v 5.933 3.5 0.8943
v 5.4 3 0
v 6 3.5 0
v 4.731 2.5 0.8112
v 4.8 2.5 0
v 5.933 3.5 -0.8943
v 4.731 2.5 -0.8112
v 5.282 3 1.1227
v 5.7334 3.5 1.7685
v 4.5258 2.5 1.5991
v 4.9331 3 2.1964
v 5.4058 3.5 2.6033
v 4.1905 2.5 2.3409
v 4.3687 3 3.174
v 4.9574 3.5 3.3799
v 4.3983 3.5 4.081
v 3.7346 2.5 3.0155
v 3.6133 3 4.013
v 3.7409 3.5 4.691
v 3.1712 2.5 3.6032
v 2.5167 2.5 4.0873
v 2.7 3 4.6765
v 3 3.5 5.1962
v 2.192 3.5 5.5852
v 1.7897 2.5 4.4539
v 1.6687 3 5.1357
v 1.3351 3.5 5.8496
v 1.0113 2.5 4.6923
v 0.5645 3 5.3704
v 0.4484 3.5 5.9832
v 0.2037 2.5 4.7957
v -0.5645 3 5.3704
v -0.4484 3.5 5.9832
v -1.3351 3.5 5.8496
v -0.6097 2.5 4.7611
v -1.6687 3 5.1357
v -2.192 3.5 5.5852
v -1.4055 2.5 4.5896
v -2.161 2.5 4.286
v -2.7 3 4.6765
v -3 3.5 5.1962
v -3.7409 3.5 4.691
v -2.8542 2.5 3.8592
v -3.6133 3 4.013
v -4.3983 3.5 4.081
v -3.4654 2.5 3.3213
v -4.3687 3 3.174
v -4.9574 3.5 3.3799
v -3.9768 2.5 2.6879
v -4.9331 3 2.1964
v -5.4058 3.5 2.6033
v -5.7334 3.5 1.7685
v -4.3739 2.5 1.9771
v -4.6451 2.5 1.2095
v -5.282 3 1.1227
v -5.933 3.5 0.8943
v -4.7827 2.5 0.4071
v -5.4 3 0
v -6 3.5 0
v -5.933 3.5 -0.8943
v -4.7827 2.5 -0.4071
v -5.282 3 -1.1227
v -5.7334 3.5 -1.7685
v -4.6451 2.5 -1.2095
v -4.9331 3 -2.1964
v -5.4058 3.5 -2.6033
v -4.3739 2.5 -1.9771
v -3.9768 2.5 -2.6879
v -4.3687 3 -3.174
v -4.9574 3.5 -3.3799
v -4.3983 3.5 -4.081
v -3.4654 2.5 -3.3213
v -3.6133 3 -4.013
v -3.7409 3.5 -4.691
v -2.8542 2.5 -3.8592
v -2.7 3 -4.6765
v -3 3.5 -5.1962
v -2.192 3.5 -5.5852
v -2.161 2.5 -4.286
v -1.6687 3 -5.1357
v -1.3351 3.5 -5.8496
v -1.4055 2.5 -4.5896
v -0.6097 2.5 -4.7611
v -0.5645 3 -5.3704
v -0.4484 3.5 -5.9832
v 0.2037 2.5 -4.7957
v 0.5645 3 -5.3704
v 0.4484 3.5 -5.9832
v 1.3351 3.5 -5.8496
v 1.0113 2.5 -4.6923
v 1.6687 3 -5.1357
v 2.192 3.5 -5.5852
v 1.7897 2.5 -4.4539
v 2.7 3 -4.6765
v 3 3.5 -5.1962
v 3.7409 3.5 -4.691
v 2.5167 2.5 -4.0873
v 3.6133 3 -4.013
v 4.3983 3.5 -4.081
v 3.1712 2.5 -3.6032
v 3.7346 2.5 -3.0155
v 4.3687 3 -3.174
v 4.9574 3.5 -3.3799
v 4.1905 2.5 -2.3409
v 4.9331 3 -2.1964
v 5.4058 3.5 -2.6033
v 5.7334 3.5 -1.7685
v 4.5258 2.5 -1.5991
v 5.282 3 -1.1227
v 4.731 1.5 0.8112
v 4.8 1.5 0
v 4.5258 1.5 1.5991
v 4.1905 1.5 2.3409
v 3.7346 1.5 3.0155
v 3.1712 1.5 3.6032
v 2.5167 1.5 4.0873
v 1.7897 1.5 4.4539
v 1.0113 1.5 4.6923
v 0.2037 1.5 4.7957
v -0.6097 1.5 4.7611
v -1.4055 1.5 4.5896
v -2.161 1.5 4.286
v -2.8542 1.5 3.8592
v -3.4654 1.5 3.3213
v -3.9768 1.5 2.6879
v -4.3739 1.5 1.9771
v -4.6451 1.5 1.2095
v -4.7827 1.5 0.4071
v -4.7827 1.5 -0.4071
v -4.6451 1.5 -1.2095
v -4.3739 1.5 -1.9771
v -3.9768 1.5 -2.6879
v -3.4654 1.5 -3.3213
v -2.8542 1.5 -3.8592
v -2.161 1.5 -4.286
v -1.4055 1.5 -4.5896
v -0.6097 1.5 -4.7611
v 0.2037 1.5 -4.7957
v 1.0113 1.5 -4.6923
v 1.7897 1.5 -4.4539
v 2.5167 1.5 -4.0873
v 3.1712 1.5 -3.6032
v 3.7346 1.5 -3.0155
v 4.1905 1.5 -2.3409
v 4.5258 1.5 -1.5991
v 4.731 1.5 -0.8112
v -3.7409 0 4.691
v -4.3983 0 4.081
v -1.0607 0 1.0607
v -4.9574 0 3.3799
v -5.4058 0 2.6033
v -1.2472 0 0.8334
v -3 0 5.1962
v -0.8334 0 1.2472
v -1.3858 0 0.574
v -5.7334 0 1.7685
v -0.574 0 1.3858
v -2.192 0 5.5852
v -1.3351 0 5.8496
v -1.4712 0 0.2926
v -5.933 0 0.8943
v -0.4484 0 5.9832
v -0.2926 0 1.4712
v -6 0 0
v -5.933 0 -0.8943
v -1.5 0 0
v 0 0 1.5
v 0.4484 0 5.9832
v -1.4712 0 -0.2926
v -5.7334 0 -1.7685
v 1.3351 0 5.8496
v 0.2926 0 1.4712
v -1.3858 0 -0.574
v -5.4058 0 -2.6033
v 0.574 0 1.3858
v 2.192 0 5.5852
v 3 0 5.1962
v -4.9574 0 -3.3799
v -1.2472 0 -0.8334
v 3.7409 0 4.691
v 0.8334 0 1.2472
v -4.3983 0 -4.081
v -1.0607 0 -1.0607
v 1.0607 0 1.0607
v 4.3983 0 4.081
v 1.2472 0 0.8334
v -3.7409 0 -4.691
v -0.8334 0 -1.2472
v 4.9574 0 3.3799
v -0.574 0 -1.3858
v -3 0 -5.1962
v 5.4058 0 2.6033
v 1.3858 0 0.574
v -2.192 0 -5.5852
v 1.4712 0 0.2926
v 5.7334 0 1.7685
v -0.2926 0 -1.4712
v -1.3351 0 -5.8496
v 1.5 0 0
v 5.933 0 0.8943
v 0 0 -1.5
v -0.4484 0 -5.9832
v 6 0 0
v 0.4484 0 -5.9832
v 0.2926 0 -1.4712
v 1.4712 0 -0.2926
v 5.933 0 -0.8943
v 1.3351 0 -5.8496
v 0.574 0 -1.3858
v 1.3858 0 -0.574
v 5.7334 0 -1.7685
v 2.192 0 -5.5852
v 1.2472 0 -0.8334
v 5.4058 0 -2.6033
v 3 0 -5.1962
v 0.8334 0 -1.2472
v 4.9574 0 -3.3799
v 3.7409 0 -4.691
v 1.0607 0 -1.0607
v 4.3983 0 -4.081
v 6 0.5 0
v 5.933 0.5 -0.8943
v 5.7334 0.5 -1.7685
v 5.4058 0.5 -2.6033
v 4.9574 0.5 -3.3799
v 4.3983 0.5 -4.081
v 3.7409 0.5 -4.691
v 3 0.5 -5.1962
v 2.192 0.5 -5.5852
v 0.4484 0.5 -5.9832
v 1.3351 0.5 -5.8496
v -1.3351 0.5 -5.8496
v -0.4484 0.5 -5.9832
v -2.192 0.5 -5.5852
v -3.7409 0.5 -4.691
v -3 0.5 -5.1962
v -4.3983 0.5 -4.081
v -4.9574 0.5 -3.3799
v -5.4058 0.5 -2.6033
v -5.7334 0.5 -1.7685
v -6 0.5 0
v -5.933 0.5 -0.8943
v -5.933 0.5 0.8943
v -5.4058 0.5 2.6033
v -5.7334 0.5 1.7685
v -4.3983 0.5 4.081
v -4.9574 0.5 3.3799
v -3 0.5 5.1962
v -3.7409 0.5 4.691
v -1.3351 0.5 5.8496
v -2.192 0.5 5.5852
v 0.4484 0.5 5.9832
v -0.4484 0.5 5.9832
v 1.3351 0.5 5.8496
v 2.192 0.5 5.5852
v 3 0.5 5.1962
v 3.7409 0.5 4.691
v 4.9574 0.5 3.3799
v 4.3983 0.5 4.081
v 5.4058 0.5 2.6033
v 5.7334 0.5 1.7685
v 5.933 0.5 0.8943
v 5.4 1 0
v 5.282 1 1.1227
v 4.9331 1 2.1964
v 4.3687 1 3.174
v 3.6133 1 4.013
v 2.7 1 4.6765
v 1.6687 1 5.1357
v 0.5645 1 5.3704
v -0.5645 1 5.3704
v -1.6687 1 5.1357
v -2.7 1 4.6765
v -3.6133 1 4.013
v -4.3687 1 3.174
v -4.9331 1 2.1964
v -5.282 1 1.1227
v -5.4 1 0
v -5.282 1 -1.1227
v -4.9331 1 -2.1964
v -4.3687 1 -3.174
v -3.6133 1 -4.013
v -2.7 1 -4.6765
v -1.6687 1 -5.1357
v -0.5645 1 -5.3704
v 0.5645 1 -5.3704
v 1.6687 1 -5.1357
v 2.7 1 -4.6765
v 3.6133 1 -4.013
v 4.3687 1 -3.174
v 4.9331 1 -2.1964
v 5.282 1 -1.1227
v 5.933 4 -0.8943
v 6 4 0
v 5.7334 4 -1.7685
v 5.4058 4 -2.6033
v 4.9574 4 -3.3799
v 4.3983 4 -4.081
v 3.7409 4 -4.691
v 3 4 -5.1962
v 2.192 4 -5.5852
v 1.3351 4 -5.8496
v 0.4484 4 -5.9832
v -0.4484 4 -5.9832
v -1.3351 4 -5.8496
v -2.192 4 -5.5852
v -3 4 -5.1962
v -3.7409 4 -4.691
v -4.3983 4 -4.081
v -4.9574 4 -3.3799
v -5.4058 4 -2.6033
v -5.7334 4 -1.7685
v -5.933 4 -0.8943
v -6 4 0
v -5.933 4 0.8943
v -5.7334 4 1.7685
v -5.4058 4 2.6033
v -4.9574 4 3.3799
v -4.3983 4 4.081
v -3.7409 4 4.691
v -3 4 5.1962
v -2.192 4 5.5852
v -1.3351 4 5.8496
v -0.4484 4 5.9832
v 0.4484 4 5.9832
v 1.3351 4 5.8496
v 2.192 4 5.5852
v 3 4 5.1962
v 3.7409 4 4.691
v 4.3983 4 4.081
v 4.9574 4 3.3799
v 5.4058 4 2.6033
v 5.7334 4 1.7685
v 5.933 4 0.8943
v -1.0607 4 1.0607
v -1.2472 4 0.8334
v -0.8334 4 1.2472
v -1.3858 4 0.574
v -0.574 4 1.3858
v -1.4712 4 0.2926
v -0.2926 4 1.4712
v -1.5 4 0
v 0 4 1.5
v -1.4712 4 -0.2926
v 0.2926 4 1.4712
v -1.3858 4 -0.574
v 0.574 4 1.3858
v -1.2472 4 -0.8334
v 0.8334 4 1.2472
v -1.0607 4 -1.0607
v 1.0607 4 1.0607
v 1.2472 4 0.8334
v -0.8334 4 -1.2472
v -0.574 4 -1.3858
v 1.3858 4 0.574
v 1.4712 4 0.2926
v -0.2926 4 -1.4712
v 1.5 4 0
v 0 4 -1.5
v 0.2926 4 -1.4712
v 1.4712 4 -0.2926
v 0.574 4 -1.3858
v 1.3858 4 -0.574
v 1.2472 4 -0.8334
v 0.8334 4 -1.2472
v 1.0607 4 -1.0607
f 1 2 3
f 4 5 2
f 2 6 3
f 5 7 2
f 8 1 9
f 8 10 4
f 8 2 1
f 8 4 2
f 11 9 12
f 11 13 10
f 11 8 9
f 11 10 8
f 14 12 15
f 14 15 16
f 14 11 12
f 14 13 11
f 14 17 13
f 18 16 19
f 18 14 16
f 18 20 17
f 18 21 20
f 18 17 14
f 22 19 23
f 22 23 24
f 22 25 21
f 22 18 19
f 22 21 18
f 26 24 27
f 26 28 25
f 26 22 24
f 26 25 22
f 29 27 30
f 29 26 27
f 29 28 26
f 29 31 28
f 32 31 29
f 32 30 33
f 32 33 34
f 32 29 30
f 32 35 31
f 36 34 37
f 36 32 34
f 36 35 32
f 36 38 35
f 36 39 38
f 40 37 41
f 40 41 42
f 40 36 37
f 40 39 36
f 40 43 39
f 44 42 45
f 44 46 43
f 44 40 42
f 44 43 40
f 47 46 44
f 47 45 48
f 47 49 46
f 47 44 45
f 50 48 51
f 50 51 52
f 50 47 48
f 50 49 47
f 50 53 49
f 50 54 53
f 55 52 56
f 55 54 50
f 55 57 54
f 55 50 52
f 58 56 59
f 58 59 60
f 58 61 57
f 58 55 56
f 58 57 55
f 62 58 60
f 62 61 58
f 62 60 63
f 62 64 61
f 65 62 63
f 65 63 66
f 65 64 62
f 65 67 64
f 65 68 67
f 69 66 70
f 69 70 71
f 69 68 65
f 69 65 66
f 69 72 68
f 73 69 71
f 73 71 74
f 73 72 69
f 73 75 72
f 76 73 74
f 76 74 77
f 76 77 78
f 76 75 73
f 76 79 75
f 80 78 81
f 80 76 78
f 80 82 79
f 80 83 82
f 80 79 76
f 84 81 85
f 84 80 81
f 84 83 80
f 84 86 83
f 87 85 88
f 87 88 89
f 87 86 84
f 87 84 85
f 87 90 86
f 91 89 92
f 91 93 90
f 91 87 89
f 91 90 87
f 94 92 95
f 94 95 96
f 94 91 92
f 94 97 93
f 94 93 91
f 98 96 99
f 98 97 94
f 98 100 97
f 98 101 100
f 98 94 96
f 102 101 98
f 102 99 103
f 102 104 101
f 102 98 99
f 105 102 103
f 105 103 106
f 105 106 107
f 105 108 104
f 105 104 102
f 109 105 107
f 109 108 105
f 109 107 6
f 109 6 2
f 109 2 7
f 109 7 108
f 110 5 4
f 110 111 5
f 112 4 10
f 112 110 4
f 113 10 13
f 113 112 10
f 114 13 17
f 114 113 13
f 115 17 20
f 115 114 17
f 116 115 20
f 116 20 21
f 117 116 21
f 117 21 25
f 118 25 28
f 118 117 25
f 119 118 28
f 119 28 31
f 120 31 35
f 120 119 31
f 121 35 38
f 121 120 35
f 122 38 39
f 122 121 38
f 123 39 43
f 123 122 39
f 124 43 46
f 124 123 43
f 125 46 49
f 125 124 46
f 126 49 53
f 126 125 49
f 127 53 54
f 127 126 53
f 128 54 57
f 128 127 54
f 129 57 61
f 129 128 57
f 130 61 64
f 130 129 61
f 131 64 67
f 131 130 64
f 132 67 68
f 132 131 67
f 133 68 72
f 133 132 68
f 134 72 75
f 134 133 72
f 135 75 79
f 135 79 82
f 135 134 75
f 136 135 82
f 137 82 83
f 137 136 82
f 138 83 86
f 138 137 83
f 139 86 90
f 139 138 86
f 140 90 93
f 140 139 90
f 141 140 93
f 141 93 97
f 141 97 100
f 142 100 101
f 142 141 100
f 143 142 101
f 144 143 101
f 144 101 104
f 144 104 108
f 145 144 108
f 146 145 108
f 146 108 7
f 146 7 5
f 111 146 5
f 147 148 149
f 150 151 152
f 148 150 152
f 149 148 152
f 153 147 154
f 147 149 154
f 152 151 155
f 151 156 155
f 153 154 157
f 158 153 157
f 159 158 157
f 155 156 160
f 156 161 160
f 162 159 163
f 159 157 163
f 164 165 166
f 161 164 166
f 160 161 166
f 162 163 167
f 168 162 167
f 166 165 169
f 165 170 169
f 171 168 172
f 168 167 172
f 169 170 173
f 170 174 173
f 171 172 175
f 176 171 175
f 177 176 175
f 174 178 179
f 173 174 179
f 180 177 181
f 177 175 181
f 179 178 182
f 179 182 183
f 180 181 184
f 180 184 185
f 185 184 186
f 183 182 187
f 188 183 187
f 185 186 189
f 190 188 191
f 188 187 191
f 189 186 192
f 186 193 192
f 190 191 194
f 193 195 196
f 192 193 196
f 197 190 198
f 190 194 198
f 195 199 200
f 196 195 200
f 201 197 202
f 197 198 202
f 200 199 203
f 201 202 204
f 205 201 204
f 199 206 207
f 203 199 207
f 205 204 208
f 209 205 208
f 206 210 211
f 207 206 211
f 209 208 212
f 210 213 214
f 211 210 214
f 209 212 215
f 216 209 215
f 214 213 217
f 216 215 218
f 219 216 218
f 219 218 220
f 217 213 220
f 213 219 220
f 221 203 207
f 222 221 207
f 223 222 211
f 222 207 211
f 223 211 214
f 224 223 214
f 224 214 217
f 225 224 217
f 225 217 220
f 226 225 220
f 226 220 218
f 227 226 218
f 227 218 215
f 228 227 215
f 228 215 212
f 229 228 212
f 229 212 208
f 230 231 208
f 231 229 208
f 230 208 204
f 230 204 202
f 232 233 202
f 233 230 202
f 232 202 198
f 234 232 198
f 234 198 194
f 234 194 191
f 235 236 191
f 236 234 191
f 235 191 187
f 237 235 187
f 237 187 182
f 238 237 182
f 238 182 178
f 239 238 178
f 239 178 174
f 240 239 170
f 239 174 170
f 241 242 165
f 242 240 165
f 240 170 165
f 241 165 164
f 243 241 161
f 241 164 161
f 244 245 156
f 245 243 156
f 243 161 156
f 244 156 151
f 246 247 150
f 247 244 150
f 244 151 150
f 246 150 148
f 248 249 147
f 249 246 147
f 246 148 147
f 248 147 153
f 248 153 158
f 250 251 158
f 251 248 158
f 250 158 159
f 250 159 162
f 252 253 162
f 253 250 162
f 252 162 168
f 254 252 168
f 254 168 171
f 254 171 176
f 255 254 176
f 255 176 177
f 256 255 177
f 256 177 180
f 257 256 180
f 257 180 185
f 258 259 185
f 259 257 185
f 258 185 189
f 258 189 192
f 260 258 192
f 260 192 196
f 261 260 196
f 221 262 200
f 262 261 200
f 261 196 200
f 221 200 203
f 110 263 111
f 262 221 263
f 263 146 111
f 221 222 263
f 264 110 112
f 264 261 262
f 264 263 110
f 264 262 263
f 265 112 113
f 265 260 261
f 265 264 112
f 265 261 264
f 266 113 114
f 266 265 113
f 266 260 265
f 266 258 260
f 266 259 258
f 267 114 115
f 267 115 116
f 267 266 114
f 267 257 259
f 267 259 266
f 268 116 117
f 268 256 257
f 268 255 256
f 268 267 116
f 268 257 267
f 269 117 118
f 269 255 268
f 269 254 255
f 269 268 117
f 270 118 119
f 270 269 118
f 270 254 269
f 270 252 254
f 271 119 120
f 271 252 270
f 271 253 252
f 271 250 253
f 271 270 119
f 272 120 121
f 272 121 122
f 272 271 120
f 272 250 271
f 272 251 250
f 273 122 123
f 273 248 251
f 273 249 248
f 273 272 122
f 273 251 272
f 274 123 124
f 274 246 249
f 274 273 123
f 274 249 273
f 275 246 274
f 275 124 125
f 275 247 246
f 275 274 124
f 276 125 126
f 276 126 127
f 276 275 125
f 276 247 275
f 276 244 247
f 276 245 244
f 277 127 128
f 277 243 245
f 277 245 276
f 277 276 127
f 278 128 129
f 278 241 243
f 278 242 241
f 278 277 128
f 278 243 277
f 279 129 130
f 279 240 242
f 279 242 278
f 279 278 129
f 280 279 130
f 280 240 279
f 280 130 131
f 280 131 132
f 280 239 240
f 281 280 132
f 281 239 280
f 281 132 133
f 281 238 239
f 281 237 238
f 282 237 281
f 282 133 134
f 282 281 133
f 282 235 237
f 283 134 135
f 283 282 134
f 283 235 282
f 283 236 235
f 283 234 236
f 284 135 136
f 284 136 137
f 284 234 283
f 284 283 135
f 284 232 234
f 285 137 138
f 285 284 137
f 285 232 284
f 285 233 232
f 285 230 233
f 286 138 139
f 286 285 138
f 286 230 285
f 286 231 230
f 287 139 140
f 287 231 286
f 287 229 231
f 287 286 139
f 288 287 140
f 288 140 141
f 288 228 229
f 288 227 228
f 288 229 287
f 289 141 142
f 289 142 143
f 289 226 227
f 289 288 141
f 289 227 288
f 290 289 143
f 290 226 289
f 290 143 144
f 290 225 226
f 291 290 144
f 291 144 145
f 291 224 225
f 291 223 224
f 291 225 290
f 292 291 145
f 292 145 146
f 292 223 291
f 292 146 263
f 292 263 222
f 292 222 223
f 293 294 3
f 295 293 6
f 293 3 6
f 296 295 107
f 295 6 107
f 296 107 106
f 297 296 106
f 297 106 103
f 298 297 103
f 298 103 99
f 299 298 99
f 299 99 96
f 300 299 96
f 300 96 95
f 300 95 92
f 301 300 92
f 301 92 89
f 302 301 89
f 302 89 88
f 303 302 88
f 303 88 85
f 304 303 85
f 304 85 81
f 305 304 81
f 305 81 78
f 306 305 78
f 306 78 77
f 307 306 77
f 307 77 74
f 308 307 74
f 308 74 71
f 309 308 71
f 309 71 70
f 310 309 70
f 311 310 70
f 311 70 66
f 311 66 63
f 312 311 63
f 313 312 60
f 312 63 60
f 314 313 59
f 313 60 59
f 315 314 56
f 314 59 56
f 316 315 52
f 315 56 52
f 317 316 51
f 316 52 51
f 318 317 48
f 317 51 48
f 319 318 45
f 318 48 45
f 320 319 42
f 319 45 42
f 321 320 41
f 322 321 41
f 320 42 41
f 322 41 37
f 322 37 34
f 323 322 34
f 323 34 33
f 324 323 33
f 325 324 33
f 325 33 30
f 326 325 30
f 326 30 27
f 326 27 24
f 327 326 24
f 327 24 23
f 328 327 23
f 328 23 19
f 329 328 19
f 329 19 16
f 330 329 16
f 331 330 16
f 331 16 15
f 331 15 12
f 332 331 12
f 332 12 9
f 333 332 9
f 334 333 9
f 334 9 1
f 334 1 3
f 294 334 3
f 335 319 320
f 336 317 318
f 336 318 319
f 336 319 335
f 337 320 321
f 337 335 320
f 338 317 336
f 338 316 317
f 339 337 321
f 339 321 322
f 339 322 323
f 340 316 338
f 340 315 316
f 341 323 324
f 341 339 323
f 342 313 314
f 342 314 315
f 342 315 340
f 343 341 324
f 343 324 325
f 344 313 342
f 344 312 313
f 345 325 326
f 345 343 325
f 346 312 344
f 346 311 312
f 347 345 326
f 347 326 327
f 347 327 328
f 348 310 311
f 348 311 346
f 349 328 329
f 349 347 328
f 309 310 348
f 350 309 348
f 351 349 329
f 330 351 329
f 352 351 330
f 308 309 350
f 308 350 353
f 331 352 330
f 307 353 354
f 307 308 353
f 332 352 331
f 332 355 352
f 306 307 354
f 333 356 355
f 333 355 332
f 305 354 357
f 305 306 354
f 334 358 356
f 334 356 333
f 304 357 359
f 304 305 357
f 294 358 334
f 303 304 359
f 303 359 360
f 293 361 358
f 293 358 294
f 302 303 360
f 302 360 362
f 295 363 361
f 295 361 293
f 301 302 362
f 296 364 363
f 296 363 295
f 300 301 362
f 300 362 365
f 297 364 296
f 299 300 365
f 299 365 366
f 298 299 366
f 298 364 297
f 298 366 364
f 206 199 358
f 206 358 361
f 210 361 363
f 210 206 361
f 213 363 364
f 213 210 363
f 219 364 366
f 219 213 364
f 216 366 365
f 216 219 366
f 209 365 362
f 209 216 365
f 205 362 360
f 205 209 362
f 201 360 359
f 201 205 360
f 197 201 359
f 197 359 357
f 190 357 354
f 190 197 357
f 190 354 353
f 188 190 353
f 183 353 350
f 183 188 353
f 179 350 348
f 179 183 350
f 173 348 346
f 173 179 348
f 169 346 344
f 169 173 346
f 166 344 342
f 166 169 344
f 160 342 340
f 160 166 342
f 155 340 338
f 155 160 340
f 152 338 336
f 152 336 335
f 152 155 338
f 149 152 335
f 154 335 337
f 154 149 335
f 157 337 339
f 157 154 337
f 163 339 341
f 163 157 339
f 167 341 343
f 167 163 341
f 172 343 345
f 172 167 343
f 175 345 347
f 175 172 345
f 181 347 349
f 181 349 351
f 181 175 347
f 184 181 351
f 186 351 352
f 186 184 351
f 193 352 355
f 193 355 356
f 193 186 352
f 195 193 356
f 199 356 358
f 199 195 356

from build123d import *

# Parameters (mm, degrees)
SKETCH1_R           = 6
SKETCH1_R_2         = 1.5
BOSS_EXTRUDE1_DEPTH = 4


with BuildPart() as part:
    # Sketch1 → Boss-Extrude1 (new body)
    with BuildSketch(Plane(origin=(0, 0, 0), x_dir=(1, 0, 0), z_dir=(0, 1, 0))):
        Circle(SKETCH1_R)
        Circle(SKETCH1_R_2, mode=Mode.SUBTRACT)
    extrude(amount=BOSS_EXTRUDE1_DEPTH)

    # Sketch6 → Cut-Revolve1 (revolve, cut)
    with BuildSketch(Plane.XY):
        Polygon((6, 0.5), (6, 3.5), (4.8, 2.5), (4.8, 1.5), align=None)
    revolve(axis=Axis((0, 4, 0), (0, -1, 0)), mode=Mode.SUBTRACT)


solid = part.part
